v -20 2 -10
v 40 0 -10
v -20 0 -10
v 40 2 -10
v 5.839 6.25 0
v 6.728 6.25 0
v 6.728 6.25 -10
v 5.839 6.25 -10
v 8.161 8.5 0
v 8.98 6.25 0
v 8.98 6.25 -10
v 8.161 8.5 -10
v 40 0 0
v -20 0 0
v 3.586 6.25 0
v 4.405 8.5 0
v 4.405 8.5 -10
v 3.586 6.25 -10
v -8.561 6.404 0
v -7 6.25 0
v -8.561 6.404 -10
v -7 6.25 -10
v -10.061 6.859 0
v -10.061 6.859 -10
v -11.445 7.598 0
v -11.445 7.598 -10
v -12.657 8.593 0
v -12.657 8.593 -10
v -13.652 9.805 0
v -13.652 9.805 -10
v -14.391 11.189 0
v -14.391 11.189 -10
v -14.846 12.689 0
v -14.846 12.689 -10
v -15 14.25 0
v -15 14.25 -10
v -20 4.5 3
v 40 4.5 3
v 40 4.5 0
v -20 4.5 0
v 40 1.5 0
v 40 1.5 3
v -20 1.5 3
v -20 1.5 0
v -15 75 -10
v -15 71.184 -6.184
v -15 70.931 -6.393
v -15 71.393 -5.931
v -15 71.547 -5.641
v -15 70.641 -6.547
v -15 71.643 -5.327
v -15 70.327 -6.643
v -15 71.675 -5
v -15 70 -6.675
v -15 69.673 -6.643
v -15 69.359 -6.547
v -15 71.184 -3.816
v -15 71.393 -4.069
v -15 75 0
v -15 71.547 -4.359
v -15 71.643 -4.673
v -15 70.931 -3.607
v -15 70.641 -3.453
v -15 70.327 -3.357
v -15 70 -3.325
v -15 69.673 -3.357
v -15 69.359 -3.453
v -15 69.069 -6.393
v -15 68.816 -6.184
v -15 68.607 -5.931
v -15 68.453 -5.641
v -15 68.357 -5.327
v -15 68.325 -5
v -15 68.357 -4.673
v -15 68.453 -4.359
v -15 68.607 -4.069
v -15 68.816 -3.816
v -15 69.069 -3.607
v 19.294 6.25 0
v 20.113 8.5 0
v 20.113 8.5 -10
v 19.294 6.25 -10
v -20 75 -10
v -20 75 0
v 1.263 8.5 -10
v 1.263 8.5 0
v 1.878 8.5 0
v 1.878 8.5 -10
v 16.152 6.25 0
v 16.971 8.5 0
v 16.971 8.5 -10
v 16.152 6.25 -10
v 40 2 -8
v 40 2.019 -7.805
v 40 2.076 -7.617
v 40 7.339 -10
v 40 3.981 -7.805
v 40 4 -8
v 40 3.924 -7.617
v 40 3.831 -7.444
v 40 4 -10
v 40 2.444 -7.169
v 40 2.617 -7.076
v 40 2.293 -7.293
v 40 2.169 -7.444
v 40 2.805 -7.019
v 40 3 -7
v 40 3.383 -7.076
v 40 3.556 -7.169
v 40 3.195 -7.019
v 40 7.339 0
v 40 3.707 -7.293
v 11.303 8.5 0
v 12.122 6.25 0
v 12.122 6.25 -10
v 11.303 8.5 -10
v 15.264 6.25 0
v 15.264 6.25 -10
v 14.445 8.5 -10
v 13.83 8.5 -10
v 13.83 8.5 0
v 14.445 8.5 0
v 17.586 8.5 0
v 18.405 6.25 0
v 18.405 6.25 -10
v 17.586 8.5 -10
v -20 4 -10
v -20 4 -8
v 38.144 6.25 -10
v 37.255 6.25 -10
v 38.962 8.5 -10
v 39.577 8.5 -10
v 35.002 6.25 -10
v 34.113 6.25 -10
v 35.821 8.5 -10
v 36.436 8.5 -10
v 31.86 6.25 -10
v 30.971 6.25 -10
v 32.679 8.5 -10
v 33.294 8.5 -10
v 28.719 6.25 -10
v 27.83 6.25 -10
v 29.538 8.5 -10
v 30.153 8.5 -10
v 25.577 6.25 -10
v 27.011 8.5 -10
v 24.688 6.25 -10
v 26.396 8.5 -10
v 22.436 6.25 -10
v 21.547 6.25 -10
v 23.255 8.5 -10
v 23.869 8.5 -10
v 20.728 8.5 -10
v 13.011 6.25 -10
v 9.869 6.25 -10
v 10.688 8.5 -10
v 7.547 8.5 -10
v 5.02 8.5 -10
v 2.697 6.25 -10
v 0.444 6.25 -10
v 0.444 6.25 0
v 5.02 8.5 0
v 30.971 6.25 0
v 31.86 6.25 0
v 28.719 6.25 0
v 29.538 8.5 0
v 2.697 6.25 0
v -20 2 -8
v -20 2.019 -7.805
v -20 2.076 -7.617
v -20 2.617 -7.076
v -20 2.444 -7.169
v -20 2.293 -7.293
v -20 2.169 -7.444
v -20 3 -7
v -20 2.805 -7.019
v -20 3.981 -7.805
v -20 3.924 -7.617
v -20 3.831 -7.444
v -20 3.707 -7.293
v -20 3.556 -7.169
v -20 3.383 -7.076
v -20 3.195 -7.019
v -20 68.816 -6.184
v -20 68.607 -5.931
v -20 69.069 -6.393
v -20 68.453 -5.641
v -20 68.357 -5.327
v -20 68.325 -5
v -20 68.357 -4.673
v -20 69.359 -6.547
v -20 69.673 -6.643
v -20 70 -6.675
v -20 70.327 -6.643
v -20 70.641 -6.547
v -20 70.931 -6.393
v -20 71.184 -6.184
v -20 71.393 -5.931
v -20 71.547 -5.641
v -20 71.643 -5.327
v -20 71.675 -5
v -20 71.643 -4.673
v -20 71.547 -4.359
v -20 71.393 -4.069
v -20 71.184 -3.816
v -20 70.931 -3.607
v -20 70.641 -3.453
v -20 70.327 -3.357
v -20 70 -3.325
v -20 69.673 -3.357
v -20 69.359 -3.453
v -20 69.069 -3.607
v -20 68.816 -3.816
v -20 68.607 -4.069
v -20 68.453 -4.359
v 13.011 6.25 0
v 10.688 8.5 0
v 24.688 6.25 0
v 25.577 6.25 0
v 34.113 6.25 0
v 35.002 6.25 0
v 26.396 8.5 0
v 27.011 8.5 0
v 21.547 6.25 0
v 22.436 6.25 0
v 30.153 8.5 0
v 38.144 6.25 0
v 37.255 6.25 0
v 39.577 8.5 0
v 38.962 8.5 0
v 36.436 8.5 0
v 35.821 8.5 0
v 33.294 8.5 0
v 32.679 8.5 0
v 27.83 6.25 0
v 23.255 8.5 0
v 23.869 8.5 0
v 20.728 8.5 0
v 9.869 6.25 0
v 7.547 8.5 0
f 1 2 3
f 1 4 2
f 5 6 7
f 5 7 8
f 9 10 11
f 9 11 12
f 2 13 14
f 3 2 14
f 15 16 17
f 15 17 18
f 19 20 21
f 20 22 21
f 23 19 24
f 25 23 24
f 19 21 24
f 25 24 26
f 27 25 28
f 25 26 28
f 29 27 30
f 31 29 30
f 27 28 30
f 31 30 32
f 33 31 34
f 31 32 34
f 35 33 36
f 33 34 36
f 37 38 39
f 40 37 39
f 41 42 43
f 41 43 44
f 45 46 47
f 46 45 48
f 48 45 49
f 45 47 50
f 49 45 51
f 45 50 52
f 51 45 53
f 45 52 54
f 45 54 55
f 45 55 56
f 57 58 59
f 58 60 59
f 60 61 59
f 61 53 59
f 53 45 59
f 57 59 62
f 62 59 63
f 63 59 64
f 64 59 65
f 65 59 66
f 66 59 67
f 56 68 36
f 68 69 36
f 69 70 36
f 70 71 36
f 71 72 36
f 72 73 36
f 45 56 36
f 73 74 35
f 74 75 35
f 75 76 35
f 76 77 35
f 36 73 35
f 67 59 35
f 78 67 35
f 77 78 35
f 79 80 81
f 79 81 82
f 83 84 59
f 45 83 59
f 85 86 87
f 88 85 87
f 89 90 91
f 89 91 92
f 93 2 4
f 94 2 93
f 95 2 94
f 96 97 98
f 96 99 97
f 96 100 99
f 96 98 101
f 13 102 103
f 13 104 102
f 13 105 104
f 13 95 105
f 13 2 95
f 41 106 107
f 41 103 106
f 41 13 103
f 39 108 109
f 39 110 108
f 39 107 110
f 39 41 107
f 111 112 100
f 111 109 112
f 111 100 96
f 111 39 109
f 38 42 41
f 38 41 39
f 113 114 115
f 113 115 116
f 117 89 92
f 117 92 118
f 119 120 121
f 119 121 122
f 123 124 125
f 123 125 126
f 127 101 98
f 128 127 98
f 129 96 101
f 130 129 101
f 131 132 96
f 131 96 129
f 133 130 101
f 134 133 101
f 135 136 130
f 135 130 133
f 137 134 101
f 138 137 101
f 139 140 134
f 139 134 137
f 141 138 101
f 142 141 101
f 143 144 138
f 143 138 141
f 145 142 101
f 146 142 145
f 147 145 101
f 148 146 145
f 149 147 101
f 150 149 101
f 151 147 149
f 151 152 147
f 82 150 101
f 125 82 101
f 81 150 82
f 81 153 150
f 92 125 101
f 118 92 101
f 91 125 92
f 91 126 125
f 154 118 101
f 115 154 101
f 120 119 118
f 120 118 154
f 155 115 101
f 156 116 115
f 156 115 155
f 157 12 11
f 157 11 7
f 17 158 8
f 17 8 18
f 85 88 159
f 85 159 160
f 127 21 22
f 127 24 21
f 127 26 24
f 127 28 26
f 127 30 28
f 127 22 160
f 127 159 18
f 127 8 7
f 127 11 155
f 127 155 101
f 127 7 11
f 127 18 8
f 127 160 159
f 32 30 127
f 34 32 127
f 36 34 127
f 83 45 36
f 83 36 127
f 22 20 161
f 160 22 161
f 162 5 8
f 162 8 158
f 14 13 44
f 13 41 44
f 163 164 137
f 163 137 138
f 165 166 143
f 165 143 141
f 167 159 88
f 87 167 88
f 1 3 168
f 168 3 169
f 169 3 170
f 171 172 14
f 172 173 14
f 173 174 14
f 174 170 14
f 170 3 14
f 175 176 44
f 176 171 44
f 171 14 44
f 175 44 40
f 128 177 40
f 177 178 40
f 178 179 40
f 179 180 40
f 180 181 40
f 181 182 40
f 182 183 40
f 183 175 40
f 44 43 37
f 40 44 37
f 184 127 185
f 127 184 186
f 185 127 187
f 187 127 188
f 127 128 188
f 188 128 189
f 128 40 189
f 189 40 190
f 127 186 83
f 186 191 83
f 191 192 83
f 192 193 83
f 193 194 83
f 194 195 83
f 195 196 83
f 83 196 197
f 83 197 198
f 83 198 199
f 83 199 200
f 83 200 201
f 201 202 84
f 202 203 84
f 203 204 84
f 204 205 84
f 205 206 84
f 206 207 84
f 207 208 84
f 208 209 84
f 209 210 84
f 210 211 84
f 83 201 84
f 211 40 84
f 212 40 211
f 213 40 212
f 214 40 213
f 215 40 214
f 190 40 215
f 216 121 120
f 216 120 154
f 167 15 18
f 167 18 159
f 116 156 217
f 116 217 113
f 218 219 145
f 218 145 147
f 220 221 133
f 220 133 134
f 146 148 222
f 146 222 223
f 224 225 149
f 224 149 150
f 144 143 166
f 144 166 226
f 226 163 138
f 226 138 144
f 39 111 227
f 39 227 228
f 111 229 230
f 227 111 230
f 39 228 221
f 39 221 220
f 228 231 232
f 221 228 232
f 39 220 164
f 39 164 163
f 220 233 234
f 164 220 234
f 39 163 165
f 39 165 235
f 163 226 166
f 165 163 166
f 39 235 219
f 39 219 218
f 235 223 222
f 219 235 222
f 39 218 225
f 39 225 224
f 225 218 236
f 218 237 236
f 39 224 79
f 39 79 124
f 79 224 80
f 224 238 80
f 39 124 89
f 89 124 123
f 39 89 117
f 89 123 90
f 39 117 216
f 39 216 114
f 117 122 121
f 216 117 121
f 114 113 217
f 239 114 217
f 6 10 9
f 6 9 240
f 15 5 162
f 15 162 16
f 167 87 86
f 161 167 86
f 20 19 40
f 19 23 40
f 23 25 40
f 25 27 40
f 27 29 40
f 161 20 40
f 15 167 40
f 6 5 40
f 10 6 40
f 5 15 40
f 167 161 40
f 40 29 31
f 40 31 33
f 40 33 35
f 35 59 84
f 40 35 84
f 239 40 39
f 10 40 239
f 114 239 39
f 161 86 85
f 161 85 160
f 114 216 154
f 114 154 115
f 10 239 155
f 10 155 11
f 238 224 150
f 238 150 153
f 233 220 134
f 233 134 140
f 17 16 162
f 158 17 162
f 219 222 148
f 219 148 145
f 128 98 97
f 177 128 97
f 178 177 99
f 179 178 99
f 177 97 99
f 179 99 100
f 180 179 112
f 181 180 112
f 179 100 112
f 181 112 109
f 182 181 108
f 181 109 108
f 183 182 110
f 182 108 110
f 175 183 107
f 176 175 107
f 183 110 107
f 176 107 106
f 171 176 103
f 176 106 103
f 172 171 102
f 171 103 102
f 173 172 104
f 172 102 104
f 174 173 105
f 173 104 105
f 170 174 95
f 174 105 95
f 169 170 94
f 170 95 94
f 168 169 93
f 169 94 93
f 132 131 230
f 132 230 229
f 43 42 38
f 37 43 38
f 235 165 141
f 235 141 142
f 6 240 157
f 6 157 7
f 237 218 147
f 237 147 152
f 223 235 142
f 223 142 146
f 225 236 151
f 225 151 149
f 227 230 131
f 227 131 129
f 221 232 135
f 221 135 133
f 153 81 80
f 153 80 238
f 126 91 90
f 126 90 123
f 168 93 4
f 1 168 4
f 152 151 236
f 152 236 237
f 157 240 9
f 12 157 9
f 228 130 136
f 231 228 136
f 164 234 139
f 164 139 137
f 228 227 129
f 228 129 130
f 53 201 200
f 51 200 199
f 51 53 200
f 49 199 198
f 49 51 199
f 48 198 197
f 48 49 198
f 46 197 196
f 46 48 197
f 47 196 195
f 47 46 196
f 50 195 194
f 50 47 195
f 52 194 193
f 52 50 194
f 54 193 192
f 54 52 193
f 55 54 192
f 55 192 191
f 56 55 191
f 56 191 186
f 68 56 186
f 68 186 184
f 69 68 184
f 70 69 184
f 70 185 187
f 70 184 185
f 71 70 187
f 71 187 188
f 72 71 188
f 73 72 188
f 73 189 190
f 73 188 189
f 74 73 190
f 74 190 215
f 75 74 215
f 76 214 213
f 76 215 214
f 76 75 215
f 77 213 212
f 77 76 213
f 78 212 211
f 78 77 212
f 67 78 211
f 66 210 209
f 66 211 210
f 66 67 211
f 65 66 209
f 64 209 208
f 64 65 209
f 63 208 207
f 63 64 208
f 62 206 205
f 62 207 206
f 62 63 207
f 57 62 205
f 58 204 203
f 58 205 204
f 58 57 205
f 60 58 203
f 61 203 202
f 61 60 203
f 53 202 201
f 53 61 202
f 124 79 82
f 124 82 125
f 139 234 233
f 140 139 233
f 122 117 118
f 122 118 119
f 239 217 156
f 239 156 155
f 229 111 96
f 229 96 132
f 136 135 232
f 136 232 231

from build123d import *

# Parameters (mm, degrees)
BLANKSKE_W          = 40
BLANKSKE_H          = 8.5
BLANK_DEPTH         = 10
TOOTHCUTSIM_DEPTH   = 43.09809972
TEETHCUTS_COUNT     = 14
TEETHCUTS_PITCH     = 3.14159265
BOSS_EXTRUDE1_DEPTH = 10
SKETCH2_W           = 3
SKETCH2_H           = 3
BOSS_EXTRUDE2_DEPTH = 60
CUT_EXTRUDE2_DEPTH  = 97.566039579
MOVE_FACE2_BY       = 5
FILLET2_R           = 8
SKETCH3_R           = 1.675
CUT_EXTRUDE1_DEPTH  = 94.541434669


with BuildPart() as part:
    # BlankSke → Blank (new body)
    with BuildSketch(Plane.XY):
        with Locations((20, 4.25)):
            Rectangle(BLANKSKE_W, BLANKSKE_H)
    extrude(amount=-BLANK_DEPTH)

    # TooCutSkeSim → ToothCutSim (cut, through all)
    with BuildSketch(Plane.XY):
        Polygon((0.44443537, 6.25), (-0.44443537, 6.25), (-1.272613241, 8.5254), (1.272613241, 8.5254), align=None)
    toothcutsim = extrude(amount=-TOOTHCUTSIM_DEPTH, mode=Mode.SUBTRACT)

    # TeethCuts: ToothCutSim ×14
    with Locations(*[(i * TEETHCUTS_PITCH, 0, 0) for i in range(1, TEETHCUTS_COUNT)]):
        add(toothcutsim, mode=Mode.SUBTRACT)

    # Sketch1 → Boss-Extrude1 (add)
    with BuildSketch(Plane.XY):
        Polygon((0, 0), (-20, 0), (-20, 75), (-10, 75), (-10, 6.25), (0, 6.25), align=None)
    extrude(amount=-BOSS_EXTRUDE1_DEPTH)

    # Sketch2 → Boss-Extrude2 (add)
    with BuildSketch(Plane(origin=(40, 0, 0), x_dir=(0, 0, -1), z_dir=(1, 0, 0))):
        with Locations((-1.5, 3)):
            Rectangle(SKETCH2_W, SKETCH2_H)
    extrude(amount=-BOSS_EXTRUDE2_DEPTH)

    # Sketch5 → Cut-Extrude2 (cut, through all)
    with BuildSketch(Plane(origin=(40, 0, 0), x_dir=(0, 0, -1), z_dir=(1, 0, 0))):
        with BuildLine():
            Line((10, 4), (8, 4))
            ThreePointArc((8, 4), (7, 3), (8, 2))
            Line((8, 2), (10, 2))
            Line((10, 2), (10, 4))
        make_face()
    extrude(amount=-CUT_EXTRUDE2_DEPTH, mode=Mode.SUBTRACT)

    # Move Face2: a face moved inward by 5.0
    extrude(part.faces().sort_by_distance((-10, 40.625, -5))[0], amount=MOVE_FACE2_BY, dir=(-1, 0, 0), mode=Mode.SUBTRACT)

    # Fillet2
    fillet2_edges = [part.edges().sort_by_distance(p)[0] for p in [
        (-15, 6.25, -5),
    ]]
    fillet(fillet2_edges, radius=FILLET2_R)

    # Sketch3 → Cut-Extrude1 (cut, through all)
    with BuildSketch(Plane.ZY.offset(15)):
        with Locations(Location((-5, 70, 0), (0, 0, 90))):
            Circle(SKETCH3_R)
    extrude(amount=CUT_EXTRUDE1_DEPTH, mode=Mode.SUBTRACT)


solid = part.part
